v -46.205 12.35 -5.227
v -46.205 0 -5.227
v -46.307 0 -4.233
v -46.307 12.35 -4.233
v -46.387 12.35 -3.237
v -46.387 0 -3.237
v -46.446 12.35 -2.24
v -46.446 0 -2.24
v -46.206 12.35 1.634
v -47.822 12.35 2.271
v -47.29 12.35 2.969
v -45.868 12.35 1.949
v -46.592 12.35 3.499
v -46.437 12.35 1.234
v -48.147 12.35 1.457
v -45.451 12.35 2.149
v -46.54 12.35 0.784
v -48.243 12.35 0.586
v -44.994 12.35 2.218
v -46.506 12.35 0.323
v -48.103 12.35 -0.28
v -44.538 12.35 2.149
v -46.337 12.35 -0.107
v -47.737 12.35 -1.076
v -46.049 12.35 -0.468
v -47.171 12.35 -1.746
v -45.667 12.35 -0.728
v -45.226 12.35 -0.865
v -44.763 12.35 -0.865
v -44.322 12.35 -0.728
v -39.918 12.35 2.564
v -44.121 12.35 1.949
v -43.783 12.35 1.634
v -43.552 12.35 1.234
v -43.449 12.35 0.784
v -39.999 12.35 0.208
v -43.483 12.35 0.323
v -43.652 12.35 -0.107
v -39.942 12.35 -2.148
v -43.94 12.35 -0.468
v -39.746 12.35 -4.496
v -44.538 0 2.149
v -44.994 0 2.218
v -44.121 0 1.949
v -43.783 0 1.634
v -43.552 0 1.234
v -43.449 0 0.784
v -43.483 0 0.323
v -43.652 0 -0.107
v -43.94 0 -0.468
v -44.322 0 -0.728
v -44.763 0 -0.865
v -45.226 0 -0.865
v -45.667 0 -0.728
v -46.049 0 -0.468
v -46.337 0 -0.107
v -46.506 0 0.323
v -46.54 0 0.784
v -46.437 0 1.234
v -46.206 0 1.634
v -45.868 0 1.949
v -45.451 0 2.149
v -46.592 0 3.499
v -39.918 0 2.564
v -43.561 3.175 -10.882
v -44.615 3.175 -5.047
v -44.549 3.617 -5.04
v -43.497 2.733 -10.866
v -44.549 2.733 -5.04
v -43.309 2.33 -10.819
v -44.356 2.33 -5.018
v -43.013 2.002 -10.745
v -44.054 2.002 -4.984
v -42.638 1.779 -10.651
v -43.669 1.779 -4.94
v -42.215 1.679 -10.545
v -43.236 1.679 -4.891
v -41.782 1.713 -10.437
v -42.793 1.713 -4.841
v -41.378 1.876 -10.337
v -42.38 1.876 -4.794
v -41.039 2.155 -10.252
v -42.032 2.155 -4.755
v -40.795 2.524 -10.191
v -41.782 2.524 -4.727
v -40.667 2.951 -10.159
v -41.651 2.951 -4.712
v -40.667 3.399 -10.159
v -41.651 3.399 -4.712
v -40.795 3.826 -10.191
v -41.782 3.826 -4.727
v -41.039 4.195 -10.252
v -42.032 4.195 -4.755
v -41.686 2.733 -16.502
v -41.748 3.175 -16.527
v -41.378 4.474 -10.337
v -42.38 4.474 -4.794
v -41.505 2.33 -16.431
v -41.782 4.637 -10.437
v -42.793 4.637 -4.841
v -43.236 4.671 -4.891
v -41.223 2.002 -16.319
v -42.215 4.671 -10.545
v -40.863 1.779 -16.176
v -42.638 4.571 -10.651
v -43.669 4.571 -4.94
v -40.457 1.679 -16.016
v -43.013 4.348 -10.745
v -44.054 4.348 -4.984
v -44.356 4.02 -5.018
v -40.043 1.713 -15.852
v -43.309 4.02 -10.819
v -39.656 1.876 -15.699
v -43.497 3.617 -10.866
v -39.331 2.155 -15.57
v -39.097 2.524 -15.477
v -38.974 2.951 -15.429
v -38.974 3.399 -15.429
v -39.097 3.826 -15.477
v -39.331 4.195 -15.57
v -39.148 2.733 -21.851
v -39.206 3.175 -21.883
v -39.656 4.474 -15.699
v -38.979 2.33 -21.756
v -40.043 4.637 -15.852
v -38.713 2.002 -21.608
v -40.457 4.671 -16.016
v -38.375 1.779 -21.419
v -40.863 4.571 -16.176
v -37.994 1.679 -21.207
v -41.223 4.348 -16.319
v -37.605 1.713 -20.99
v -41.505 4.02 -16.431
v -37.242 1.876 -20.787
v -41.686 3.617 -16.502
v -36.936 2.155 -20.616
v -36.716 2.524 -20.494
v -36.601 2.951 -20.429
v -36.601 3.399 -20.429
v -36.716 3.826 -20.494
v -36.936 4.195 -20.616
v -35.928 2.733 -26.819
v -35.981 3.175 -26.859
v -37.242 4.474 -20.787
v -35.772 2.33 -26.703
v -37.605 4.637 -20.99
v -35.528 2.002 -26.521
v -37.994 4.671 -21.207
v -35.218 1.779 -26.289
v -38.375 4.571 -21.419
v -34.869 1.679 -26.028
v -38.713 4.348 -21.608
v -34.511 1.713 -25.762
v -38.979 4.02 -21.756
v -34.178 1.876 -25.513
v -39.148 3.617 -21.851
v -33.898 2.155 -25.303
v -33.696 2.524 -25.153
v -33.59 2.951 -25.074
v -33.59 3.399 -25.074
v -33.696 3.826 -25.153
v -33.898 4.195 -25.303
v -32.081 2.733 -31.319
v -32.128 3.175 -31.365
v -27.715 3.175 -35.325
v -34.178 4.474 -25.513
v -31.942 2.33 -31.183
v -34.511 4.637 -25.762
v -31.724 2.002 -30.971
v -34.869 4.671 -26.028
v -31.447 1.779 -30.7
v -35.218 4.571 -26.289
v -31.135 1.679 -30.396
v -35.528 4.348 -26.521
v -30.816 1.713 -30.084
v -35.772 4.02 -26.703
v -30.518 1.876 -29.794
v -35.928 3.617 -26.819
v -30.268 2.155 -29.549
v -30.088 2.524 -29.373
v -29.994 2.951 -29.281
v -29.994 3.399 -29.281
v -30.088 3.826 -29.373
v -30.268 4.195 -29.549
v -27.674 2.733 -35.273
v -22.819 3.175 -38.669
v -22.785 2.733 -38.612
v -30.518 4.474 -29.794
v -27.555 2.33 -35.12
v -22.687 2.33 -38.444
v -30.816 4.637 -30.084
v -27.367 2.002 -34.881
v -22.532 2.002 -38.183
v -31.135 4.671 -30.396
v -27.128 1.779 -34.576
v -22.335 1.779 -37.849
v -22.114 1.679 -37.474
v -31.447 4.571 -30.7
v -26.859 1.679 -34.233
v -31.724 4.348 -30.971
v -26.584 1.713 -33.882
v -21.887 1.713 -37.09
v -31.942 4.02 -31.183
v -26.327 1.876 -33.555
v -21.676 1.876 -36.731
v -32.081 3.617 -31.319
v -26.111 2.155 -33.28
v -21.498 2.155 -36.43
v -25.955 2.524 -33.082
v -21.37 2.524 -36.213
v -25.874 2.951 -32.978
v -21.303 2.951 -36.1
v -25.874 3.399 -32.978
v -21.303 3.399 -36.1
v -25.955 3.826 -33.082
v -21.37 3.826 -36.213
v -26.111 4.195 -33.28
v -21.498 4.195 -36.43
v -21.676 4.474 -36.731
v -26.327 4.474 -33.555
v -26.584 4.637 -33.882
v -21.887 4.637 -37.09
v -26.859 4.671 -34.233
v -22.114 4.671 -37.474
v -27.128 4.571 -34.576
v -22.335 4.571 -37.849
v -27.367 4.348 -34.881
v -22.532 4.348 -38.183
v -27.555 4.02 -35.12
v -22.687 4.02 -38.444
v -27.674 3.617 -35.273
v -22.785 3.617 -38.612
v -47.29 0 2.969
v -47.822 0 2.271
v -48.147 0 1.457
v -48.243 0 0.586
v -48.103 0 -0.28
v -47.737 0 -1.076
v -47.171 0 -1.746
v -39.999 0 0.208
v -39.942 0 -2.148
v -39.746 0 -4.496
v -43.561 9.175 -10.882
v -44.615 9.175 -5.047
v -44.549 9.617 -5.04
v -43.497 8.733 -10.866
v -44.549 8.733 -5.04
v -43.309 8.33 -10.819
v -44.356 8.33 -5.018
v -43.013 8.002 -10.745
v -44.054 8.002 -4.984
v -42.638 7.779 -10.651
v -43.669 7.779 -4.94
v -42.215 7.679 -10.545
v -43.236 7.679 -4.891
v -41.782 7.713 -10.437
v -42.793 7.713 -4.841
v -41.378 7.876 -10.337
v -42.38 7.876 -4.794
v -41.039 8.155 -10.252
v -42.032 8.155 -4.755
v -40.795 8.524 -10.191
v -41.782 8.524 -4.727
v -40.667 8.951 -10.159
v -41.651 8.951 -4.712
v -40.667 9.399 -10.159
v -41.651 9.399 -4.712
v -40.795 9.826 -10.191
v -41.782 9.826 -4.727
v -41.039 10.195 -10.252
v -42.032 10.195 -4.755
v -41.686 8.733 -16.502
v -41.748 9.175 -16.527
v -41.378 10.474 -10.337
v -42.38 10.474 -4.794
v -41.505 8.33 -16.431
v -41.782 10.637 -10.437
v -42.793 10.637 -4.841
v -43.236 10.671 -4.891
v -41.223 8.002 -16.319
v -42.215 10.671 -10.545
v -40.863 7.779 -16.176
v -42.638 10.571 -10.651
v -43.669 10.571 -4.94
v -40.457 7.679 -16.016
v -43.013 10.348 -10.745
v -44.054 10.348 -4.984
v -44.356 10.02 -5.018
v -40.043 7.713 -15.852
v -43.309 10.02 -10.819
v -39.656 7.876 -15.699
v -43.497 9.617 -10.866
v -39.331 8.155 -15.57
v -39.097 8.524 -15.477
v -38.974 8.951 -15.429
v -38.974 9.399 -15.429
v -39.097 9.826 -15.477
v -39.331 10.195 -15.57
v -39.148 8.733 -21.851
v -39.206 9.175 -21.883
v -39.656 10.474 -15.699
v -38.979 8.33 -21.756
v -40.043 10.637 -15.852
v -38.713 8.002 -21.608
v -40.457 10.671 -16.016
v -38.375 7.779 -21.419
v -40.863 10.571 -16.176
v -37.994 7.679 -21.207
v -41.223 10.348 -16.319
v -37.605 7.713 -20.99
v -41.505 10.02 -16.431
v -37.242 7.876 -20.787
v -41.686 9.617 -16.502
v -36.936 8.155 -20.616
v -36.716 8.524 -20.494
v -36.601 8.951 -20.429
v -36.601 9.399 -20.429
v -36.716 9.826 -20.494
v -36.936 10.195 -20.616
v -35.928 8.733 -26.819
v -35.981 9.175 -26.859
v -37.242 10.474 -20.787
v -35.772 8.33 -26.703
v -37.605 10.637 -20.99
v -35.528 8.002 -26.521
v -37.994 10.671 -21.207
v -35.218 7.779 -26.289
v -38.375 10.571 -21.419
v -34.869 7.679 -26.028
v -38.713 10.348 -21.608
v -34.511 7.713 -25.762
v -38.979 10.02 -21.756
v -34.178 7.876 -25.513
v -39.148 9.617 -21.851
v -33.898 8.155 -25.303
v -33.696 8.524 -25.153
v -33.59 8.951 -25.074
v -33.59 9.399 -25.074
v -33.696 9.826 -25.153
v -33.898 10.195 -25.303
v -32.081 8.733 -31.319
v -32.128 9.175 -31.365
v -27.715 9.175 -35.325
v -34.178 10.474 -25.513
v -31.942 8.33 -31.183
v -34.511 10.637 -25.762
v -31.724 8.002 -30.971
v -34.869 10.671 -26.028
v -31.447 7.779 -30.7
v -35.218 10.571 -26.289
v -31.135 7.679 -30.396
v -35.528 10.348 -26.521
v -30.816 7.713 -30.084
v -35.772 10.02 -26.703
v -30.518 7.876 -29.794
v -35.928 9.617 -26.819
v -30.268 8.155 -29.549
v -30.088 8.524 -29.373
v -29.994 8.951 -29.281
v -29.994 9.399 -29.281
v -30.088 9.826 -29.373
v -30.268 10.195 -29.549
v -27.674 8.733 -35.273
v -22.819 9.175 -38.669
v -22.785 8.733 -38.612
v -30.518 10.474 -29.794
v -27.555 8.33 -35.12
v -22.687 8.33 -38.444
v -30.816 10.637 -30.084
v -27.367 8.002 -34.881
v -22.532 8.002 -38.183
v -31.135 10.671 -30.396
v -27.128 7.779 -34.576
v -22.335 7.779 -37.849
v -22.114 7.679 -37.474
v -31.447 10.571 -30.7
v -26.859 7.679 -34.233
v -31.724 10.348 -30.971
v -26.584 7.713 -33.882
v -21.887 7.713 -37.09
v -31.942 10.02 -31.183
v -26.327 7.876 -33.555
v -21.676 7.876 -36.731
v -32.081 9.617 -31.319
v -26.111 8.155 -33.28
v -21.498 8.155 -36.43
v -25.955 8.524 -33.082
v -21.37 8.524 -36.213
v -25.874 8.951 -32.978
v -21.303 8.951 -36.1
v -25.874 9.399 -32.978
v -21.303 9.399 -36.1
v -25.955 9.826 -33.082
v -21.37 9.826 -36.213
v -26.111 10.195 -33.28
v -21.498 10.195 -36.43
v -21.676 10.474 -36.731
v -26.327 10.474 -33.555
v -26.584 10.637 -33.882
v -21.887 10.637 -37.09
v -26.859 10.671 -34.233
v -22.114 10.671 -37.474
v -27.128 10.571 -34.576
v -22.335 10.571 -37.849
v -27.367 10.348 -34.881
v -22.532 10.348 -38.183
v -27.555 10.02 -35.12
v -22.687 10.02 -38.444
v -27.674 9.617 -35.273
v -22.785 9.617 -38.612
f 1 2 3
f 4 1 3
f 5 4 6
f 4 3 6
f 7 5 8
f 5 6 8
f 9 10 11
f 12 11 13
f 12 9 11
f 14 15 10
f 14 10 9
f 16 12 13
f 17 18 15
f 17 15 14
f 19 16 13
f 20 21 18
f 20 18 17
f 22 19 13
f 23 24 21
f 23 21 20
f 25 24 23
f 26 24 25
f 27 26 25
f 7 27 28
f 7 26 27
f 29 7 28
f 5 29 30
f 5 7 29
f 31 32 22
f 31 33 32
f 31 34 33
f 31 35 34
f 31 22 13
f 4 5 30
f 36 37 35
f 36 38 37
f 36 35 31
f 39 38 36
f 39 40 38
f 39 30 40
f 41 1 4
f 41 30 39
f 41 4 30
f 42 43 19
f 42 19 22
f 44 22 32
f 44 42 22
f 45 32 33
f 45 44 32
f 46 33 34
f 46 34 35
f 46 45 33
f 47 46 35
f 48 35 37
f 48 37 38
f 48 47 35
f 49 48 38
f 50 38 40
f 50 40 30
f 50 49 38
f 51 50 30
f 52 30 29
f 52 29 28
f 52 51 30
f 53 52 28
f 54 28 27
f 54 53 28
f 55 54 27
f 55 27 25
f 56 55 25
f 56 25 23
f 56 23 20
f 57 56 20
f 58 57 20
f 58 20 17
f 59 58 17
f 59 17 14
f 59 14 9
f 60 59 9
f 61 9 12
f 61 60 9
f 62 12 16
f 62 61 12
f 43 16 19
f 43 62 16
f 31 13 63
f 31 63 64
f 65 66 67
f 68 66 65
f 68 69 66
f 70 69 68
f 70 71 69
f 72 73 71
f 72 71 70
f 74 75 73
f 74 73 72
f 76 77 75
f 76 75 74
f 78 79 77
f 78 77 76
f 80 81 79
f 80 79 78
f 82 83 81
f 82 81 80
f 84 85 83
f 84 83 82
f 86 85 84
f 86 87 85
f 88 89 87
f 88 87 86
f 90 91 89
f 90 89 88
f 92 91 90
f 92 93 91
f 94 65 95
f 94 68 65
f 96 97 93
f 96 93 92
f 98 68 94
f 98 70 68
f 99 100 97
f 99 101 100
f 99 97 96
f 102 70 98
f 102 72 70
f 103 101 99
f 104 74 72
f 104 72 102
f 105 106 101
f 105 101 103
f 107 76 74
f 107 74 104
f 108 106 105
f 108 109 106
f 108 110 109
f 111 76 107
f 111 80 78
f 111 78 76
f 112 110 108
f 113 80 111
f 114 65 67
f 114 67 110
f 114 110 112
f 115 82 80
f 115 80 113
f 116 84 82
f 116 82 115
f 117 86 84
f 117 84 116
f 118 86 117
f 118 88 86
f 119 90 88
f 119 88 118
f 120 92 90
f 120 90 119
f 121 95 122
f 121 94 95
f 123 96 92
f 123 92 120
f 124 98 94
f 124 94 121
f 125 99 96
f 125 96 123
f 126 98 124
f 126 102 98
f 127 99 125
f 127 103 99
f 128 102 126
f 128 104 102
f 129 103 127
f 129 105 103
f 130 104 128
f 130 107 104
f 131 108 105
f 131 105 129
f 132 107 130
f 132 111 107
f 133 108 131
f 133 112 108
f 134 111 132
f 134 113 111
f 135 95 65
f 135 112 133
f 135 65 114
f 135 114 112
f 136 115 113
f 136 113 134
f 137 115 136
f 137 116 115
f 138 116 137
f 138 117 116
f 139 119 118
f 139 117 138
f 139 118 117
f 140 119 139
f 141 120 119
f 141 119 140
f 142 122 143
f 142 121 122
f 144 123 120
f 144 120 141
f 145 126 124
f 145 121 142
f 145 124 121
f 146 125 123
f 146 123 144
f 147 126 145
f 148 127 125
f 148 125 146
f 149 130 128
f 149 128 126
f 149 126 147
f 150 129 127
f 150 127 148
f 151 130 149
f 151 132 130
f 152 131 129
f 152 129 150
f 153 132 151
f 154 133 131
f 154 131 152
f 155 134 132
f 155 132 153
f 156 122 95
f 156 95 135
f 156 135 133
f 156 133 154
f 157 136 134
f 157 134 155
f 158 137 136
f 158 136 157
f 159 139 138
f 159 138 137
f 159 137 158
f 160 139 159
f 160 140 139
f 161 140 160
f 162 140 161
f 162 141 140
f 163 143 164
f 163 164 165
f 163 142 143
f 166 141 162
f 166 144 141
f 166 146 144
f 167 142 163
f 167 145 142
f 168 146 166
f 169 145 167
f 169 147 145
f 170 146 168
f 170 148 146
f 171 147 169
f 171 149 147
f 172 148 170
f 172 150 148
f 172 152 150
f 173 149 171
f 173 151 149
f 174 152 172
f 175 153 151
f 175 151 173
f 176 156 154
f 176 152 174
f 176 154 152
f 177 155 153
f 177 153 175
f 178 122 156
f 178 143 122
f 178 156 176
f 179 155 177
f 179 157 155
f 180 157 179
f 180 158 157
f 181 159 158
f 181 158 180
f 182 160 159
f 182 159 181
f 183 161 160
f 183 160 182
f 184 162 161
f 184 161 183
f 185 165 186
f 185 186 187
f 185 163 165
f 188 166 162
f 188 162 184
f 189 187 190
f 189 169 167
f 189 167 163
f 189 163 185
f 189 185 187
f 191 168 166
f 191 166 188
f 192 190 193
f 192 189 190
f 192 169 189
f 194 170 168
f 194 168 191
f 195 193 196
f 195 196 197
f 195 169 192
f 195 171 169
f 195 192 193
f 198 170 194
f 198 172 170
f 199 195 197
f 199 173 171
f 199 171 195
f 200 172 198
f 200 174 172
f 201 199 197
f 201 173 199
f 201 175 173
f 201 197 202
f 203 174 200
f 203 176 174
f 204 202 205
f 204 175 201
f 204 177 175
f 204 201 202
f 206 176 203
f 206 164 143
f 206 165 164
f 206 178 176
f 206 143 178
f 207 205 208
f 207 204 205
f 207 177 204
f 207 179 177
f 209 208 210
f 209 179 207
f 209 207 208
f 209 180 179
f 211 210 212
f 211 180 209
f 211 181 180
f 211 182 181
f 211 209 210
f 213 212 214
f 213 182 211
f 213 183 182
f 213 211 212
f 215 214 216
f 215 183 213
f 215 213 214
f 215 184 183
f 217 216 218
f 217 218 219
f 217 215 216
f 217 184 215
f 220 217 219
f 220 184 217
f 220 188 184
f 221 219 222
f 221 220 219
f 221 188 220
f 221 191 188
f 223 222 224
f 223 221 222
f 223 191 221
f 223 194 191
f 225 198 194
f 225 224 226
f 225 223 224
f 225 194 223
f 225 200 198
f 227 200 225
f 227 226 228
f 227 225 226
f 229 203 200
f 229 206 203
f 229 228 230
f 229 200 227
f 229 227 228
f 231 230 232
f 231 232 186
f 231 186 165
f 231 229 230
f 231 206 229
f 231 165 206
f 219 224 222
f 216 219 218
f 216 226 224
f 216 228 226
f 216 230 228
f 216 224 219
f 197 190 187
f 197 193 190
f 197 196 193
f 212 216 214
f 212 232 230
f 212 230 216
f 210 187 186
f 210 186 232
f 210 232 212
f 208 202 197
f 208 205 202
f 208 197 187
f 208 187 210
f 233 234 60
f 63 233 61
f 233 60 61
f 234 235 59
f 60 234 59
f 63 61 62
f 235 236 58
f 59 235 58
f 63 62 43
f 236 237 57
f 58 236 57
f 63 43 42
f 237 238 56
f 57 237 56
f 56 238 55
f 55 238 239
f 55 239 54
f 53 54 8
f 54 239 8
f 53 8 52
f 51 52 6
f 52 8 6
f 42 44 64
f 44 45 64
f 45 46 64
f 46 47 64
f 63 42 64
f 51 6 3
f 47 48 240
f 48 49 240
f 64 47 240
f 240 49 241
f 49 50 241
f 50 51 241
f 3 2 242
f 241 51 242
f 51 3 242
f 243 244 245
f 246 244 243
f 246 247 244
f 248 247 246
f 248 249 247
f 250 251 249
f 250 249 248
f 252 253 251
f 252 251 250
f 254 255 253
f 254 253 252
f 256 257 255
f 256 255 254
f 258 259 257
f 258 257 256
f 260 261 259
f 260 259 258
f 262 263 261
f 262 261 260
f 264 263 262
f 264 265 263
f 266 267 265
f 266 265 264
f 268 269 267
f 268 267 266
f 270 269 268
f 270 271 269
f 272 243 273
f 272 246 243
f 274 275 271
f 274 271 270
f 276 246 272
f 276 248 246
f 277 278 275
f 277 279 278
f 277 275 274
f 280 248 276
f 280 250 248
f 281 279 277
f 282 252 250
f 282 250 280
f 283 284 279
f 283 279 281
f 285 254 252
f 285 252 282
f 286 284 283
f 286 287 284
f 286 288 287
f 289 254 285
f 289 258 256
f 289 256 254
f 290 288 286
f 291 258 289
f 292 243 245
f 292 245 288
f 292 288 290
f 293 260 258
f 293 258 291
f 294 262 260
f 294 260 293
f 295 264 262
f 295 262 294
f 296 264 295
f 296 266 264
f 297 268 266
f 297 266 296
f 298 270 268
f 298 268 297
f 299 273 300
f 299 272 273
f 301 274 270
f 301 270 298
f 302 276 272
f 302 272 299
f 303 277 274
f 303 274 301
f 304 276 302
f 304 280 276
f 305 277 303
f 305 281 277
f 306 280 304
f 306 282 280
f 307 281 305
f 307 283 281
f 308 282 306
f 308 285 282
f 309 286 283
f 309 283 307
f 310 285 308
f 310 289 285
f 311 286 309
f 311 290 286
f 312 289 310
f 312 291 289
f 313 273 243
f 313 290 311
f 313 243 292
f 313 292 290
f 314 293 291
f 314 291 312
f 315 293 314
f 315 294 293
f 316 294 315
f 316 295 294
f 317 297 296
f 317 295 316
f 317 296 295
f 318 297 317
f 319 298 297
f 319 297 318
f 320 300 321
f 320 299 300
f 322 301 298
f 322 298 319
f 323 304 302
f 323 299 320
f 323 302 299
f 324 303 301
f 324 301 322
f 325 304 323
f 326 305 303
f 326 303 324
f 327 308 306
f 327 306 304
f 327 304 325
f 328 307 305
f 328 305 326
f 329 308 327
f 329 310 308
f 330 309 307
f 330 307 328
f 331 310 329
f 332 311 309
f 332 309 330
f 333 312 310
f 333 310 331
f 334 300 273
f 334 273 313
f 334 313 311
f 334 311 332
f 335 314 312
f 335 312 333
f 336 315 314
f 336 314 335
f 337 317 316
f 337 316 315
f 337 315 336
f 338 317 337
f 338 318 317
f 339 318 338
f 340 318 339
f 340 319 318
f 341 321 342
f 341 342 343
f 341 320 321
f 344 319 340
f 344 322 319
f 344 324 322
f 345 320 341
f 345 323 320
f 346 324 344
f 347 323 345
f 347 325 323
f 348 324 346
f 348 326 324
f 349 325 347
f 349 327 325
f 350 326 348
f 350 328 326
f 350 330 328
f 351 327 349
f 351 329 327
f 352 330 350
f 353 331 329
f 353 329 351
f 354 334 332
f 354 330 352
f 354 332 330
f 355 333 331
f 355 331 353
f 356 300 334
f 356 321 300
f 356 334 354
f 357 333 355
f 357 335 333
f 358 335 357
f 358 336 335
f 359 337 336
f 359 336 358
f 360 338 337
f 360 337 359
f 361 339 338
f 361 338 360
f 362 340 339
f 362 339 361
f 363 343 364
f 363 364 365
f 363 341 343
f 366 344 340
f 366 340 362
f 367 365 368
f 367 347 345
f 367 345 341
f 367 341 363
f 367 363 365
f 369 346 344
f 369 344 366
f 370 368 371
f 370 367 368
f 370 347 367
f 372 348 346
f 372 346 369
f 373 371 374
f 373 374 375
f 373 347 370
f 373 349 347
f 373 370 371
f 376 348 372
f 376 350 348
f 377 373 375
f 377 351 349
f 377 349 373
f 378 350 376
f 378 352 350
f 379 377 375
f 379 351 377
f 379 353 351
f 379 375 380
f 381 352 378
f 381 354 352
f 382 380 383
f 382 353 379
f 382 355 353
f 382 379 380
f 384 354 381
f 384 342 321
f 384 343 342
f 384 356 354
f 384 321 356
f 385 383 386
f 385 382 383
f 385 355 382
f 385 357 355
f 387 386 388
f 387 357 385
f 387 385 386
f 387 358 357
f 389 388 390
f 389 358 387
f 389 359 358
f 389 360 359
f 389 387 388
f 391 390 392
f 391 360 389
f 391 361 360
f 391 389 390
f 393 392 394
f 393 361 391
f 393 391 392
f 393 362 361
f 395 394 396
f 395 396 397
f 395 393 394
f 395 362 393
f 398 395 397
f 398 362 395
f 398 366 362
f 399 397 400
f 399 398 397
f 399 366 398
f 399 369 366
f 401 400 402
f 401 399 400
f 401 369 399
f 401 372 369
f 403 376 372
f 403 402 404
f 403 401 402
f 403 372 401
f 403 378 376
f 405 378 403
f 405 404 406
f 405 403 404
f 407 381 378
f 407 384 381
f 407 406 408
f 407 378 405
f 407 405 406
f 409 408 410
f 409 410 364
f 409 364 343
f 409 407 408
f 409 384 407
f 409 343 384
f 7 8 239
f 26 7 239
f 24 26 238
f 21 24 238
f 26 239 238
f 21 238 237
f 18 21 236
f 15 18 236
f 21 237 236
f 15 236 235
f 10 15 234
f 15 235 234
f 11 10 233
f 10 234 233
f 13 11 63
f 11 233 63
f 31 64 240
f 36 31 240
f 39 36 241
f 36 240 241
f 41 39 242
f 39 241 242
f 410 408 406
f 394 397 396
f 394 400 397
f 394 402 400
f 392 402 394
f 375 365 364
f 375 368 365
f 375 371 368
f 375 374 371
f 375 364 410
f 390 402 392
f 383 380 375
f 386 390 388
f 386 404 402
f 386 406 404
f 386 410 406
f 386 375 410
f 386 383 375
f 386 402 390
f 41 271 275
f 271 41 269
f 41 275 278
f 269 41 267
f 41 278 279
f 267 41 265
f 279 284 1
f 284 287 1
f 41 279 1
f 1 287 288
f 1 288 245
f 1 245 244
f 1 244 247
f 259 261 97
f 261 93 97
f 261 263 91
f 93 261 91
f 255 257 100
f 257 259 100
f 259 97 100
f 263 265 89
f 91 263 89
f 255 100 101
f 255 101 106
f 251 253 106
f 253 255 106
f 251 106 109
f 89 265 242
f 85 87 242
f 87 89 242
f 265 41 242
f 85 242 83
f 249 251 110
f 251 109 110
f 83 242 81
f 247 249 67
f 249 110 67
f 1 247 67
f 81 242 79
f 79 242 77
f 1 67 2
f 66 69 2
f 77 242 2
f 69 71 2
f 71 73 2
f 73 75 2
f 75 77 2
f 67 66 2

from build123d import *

# Parameters (mm, degrees)
SKETCH2_R           = 1.55
BOSS_EXTRUDE1_DEPTH = 12.35
SKETCH3_R           = 1.5


with BuildPart() as part:
    # Sketch2 → Boss-Extrude1 (new body)
    with BuildSketch(Plane(origin=(0, 0, 0), x_dir=(1, 0, 0), z_dir=(0, 1, 0))):
        with BuildLine():
            ThreePointArc((-39.917771177, -2.56350234), (-39.988230838, 0.970254828), (-39.746472283, 4.496436488))
            Line((-39.746472283, 4.496436488), (-46.205274029, 5.227107417))
            ThreePointArc((-46.205274029, 5.227107417), (-46.34972481, 3.735372816), (-46.44602765, 2.239757921))
            ThreePointArc((-46.44602765, 2.239757921), (-48.2434435, -0.585642563), (-46.591633685, -3.498564803))
            Line((-46.591633685, -3.498564803), (-39.917771177, -2.56350234))
        make_face()
        with Locations(Location((-44.994489261, -0.668082567, 0), (0, 0, 270))):
            Circle(SKETCH2_R, mode=Mode.SUBTRACT)
    extrude(amount=BOSS_EXTRUDE1_DEPTH)

    # Sweep1: sweep along a path in Sketch7
    with BuildLine(Plane(origin=(0, 0, 0), x_dir=(1, 0, 0), z_dir=(0, 1, 0))) as sweep1_path:
        ThreePointArc((-39.746472283, 4.496436488), (-33.564183671, 21.758804529), (-20.329010289, 34.448967193))
    # Sketch3 → Sweep1 (sweep)
    with BuildSketch(Plane(origin=(0, 0, 0), x_dir=(-0.9936618070654342, 0, -0.11241091219030289), z_dir=(0.11241091219030287, 0, -0.993661807065434))):
        with Locations((43.4, 9.175)):
            Circle(SKETCH3_R)
        with Locations((43.4, 3.175)):
            Circle(SKETCH3_R)
    sweep(path=sweep1_path.line)


solid = part.part
